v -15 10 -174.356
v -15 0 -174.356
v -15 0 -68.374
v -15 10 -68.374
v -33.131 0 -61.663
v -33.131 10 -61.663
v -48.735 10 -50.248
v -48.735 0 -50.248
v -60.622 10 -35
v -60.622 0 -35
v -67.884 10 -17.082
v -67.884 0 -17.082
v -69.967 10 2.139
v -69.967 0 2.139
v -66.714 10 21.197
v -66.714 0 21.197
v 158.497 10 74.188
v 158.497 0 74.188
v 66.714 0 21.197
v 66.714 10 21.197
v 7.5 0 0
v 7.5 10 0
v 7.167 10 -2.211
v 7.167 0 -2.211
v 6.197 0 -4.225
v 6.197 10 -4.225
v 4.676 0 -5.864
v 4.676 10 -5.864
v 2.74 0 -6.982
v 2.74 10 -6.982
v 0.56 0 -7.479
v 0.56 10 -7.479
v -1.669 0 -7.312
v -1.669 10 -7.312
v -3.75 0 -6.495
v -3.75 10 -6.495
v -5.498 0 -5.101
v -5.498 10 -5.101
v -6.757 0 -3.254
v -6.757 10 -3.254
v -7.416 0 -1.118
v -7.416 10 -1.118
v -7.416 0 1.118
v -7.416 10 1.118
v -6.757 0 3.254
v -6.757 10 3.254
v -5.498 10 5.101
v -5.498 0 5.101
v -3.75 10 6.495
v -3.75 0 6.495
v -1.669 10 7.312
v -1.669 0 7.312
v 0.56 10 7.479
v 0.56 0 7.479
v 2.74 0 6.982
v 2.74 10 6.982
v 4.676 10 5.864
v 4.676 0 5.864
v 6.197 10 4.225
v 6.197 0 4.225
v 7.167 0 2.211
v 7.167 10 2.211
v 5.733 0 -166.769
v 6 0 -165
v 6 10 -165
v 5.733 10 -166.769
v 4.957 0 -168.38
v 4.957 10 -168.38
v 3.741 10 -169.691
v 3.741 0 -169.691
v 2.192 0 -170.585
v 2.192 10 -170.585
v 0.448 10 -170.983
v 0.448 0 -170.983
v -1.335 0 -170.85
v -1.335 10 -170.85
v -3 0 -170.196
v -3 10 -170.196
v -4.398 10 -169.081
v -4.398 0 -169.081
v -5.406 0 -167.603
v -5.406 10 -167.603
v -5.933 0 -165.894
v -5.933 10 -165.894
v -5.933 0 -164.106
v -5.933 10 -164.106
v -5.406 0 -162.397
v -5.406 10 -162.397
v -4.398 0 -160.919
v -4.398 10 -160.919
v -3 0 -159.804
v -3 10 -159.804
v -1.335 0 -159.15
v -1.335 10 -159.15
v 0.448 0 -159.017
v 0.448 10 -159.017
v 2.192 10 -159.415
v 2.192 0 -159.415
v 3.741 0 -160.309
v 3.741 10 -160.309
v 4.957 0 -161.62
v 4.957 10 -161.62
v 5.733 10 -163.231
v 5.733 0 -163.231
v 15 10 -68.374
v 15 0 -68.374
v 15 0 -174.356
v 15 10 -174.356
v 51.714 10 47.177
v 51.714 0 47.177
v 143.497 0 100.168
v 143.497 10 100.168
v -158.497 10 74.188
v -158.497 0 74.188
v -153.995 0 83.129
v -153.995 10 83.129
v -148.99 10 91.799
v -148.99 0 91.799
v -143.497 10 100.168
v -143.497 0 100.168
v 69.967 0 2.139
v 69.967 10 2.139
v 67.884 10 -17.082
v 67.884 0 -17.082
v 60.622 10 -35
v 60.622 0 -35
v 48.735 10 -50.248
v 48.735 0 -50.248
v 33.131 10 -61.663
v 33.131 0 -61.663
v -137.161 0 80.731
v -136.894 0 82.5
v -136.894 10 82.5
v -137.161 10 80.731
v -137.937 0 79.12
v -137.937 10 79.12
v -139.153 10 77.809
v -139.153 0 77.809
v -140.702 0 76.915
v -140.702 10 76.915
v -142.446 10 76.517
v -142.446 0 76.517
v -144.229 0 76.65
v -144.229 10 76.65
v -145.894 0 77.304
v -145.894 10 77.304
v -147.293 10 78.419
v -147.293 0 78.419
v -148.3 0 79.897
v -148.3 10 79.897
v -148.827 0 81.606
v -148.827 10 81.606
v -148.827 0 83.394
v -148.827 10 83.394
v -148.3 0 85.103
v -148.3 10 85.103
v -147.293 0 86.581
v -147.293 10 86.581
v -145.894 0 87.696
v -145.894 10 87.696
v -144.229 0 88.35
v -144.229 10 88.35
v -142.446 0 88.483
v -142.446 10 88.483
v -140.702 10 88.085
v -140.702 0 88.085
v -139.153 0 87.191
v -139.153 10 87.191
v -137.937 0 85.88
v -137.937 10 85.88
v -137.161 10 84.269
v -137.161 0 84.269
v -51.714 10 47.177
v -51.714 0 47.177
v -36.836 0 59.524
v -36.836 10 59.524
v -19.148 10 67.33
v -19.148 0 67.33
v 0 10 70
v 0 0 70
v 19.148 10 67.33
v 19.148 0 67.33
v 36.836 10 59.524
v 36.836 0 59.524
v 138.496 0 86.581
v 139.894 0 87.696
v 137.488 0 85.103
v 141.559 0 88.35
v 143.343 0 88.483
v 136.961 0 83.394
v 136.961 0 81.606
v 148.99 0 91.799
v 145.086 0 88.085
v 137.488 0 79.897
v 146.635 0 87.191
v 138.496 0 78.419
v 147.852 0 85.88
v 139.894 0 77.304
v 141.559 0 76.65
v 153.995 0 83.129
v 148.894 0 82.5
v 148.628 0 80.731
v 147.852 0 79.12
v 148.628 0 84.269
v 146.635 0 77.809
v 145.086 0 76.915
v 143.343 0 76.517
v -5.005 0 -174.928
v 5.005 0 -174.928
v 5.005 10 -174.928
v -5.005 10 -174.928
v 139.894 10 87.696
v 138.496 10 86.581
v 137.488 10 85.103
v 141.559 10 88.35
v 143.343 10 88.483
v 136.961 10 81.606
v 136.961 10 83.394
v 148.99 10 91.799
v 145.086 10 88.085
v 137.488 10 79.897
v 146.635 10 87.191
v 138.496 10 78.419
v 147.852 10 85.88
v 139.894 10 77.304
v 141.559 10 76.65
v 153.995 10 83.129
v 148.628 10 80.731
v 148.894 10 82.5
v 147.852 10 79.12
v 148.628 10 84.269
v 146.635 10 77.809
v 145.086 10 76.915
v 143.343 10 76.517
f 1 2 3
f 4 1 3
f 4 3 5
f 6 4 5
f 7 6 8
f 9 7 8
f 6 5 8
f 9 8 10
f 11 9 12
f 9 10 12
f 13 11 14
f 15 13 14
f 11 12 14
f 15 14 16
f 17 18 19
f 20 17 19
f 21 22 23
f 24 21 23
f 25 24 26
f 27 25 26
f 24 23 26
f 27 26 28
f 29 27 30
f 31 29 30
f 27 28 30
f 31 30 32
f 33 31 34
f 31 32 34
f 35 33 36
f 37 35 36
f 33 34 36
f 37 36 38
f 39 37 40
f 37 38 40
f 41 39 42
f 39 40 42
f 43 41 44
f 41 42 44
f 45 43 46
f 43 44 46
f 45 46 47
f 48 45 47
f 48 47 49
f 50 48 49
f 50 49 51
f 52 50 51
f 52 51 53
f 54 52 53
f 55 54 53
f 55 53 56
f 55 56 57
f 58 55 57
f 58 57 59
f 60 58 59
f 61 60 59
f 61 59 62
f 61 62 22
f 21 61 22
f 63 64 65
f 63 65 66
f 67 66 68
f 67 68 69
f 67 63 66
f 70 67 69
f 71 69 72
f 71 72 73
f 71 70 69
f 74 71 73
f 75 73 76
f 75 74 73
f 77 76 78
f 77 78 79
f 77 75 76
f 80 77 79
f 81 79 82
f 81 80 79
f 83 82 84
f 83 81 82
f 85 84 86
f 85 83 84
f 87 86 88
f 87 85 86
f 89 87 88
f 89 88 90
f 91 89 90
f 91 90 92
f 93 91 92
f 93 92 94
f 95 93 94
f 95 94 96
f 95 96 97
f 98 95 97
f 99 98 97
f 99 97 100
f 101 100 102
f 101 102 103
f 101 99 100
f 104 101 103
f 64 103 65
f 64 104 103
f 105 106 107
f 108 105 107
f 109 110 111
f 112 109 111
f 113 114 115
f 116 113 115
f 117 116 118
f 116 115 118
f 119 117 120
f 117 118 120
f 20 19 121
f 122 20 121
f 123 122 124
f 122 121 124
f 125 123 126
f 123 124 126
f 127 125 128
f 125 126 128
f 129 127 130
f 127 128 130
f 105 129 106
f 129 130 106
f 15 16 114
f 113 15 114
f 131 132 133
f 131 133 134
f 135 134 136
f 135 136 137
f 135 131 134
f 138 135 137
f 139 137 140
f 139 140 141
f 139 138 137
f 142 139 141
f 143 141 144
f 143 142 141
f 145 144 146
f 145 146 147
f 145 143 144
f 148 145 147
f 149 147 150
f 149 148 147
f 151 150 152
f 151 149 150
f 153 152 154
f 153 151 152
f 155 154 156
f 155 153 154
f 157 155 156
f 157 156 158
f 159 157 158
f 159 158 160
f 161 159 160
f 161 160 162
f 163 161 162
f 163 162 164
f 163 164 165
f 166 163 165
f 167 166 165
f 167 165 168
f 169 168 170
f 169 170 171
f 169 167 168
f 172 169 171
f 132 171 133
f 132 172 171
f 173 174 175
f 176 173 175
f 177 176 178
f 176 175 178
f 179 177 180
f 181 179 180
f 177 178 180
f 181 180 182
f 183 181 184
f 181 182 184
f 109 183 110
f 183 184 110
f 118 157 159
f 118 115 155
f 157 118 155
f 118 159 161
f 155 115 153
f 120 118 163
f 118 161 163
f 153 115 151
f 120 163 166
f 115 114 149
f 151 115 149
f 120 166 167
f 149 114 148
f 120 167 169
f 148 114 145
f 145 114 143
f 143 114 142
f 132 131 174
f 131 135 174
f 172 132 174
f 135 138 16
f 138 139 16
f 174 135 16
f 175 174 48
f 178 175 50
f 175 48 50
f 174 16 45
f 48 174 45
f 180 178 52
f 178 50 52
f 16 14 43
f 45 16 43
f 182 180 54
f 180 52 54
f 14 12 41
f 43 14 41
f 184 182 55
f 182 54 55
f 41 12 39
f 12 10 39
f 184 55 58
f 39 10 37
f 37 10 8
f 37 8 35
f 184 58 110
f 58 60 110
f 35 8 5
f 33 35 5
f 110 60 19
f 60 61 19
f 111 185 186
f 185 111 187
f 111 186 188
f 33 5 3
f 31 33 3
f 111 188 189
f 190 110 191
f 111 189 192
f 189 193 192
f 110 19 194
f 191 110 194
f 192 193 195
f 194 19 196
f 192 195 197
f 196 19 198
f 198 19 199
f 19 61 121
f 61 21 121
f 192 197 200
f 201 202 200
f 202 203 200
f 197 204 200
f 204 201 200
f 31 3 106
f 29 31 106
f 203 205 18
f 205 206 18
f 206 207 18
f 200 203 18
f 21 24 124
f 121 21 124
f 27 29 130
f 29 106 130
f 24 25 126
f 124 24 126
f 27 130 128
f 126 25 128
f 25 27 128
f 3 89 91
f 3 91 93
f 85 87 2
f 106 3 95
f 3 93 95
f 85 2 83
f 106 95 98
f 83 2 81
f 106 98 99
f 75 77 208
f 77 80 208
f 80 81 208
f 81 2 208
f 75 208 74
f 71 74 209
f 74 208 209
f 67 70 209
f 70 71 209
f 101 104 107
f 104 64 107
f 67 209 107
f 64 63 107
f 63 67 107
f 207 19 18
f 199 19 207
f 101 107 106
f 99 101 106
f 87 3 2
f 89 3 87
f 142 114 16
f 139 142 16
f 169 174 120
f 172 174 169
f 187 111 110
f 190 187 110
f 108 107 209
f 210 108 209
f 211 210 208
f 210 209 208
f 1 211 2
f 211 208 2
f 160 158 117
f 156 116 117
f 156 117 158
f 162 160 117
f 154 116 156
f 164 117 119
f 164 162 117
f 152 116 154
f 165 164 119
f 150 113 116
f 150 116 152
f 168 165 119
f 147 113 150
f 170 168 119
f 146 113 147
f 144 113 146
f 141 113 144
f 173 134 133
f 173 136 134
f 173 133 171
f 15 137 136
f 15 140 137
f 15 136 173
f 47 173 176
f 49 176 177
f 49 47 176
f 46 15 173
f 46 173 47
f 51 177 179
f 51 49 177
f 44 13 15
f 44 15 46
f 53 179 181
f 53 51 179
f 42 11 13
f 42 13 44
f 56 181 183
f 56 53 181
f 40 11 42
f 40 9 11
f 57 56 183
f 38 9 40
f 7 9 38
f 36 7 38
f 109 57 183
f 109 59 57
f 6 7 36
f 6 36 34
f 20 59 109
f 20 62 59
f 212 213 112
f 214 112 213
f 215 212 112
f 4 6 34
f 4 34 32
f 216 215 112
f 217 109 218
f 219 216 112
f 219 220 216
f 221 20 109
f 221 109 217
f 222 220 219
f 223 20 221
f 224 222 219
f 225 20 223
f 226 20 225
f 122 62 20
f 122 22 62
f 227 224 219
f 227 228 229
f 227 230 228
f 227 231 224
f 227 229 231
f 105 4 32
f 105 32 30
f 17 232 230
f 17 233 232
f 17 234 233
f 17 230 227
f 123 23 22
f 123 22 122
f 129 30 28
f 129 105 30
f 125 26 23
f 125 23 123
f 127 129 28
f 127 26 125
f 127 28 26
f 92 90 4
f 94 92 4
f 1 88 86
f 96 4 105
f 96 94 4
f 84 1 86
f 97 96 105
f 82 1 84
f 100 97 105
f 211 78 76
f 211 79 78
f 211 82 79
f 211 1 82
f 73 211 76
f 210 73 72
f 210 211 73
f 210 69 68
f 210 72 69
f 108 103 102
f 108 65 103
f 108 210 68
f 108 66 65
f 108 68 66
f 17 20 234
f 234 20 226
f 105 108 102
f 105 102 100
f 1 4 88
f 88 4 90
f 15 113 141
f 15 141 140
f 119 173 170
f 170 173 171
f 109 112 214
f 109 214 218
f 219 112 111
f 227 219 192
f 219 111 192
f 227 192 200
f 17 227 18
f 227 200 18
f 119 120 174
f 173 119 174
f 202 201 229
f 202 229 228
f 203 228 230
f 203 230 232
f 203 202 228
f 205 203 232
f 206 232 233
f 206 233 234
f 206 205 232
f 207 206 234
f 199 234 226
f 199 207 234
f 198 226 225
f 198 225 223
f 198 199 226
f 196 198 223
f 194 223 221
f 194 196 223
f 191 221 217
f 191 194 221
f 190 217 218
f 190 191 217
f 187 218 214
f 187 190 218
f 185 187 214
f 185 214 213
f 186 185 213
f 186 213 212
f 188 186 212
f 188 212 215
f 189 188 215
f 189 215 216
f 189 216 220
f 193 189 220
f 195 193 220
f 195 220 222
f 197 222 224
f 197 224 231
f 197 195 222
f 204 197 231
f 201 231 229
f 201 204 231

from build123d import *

# Parameters (mm, degrees)
SKETCH_1_R          = 6
EXTRUDE_1_DEPTH     = 10
SKETCH_2_R          = 7.5
CUT_EXTRUDE_1_DEPTH = 11


with BuildPart() as part:
    # 草图1 → 凸台-拉伸1 (new body)
    with BuildSketch(Plane(origin=(0, 0, 0), x_dir=(1, 0, 0), z_dir=(0, 1, 0))):
        with BuildLine():
            Line((158.496688705, -74.187597814), (66.713596412, -21.196604771))
            ThreePointArc((66.713596412, -21.196604771), (60.621778265, 35), (15, 68.373971656))
            Line((15, 68.373971656), (15, 174.355957742))
            ThreePointArc((15, 174.355957742), (0, 175), (-15, 174.355957742))
            Line((-15, 174.355957742), (-15, 68.373971656))
            ThreePointArc((-15, 68.373971656), (-60.621778265, 35), (-66.713596412, -21.196604771))
            Line((-66.713596412, -21.196604771), (-158.496688705, -74.187597814))
            ThreePointArc((-158.496688705, -74.187597814), (-151.554445662, -87.5), (-143.496688705, -100.168359928))
            Line((-143.496688705, -100.168359928), (-51.713596412, -47.177366885))
            ThreePointArc((-51.713596412, -47.177366885), (0, -70), (51.713596412, -47.177366885))
            Line((51.713596412, -47.177366885), (143.496688705, -100.168359928))
            ThreePointArc((143.496688705, -100.168359928), (151.554445662, -87.5), (158.496688705, -74.187597814))
        make_face()
        with Locations((0, 165)):
            Circle(SKETCH_1_R, mode=Mode.SUBTRACT)
        with Locations((142.894191624, -82.5)):
            Circle(SKETCH_1_R, mode=Mode.SUBTRACT)
        with Locations((-142.894191624, -82.5)):
            Circle(SKETCH_1_R, mode=Mode.SUBTRACT)
    extrude(amount=EXTRUDE_1_DEPTH)

    # 草图2 → 切除-拉伸1 (cut, through all)
    with BuildSketch(Plane(origin=(0, 10, 0), x_dir=(1, 0, 0), z_dir=(0, 1, 0))):
        Circle(SKETCH_2_R)
    extrude(amount=-CUT_EXTRUDE_1_DEPTH, mode=Mode.SUBTRACT)


solid = part.part
